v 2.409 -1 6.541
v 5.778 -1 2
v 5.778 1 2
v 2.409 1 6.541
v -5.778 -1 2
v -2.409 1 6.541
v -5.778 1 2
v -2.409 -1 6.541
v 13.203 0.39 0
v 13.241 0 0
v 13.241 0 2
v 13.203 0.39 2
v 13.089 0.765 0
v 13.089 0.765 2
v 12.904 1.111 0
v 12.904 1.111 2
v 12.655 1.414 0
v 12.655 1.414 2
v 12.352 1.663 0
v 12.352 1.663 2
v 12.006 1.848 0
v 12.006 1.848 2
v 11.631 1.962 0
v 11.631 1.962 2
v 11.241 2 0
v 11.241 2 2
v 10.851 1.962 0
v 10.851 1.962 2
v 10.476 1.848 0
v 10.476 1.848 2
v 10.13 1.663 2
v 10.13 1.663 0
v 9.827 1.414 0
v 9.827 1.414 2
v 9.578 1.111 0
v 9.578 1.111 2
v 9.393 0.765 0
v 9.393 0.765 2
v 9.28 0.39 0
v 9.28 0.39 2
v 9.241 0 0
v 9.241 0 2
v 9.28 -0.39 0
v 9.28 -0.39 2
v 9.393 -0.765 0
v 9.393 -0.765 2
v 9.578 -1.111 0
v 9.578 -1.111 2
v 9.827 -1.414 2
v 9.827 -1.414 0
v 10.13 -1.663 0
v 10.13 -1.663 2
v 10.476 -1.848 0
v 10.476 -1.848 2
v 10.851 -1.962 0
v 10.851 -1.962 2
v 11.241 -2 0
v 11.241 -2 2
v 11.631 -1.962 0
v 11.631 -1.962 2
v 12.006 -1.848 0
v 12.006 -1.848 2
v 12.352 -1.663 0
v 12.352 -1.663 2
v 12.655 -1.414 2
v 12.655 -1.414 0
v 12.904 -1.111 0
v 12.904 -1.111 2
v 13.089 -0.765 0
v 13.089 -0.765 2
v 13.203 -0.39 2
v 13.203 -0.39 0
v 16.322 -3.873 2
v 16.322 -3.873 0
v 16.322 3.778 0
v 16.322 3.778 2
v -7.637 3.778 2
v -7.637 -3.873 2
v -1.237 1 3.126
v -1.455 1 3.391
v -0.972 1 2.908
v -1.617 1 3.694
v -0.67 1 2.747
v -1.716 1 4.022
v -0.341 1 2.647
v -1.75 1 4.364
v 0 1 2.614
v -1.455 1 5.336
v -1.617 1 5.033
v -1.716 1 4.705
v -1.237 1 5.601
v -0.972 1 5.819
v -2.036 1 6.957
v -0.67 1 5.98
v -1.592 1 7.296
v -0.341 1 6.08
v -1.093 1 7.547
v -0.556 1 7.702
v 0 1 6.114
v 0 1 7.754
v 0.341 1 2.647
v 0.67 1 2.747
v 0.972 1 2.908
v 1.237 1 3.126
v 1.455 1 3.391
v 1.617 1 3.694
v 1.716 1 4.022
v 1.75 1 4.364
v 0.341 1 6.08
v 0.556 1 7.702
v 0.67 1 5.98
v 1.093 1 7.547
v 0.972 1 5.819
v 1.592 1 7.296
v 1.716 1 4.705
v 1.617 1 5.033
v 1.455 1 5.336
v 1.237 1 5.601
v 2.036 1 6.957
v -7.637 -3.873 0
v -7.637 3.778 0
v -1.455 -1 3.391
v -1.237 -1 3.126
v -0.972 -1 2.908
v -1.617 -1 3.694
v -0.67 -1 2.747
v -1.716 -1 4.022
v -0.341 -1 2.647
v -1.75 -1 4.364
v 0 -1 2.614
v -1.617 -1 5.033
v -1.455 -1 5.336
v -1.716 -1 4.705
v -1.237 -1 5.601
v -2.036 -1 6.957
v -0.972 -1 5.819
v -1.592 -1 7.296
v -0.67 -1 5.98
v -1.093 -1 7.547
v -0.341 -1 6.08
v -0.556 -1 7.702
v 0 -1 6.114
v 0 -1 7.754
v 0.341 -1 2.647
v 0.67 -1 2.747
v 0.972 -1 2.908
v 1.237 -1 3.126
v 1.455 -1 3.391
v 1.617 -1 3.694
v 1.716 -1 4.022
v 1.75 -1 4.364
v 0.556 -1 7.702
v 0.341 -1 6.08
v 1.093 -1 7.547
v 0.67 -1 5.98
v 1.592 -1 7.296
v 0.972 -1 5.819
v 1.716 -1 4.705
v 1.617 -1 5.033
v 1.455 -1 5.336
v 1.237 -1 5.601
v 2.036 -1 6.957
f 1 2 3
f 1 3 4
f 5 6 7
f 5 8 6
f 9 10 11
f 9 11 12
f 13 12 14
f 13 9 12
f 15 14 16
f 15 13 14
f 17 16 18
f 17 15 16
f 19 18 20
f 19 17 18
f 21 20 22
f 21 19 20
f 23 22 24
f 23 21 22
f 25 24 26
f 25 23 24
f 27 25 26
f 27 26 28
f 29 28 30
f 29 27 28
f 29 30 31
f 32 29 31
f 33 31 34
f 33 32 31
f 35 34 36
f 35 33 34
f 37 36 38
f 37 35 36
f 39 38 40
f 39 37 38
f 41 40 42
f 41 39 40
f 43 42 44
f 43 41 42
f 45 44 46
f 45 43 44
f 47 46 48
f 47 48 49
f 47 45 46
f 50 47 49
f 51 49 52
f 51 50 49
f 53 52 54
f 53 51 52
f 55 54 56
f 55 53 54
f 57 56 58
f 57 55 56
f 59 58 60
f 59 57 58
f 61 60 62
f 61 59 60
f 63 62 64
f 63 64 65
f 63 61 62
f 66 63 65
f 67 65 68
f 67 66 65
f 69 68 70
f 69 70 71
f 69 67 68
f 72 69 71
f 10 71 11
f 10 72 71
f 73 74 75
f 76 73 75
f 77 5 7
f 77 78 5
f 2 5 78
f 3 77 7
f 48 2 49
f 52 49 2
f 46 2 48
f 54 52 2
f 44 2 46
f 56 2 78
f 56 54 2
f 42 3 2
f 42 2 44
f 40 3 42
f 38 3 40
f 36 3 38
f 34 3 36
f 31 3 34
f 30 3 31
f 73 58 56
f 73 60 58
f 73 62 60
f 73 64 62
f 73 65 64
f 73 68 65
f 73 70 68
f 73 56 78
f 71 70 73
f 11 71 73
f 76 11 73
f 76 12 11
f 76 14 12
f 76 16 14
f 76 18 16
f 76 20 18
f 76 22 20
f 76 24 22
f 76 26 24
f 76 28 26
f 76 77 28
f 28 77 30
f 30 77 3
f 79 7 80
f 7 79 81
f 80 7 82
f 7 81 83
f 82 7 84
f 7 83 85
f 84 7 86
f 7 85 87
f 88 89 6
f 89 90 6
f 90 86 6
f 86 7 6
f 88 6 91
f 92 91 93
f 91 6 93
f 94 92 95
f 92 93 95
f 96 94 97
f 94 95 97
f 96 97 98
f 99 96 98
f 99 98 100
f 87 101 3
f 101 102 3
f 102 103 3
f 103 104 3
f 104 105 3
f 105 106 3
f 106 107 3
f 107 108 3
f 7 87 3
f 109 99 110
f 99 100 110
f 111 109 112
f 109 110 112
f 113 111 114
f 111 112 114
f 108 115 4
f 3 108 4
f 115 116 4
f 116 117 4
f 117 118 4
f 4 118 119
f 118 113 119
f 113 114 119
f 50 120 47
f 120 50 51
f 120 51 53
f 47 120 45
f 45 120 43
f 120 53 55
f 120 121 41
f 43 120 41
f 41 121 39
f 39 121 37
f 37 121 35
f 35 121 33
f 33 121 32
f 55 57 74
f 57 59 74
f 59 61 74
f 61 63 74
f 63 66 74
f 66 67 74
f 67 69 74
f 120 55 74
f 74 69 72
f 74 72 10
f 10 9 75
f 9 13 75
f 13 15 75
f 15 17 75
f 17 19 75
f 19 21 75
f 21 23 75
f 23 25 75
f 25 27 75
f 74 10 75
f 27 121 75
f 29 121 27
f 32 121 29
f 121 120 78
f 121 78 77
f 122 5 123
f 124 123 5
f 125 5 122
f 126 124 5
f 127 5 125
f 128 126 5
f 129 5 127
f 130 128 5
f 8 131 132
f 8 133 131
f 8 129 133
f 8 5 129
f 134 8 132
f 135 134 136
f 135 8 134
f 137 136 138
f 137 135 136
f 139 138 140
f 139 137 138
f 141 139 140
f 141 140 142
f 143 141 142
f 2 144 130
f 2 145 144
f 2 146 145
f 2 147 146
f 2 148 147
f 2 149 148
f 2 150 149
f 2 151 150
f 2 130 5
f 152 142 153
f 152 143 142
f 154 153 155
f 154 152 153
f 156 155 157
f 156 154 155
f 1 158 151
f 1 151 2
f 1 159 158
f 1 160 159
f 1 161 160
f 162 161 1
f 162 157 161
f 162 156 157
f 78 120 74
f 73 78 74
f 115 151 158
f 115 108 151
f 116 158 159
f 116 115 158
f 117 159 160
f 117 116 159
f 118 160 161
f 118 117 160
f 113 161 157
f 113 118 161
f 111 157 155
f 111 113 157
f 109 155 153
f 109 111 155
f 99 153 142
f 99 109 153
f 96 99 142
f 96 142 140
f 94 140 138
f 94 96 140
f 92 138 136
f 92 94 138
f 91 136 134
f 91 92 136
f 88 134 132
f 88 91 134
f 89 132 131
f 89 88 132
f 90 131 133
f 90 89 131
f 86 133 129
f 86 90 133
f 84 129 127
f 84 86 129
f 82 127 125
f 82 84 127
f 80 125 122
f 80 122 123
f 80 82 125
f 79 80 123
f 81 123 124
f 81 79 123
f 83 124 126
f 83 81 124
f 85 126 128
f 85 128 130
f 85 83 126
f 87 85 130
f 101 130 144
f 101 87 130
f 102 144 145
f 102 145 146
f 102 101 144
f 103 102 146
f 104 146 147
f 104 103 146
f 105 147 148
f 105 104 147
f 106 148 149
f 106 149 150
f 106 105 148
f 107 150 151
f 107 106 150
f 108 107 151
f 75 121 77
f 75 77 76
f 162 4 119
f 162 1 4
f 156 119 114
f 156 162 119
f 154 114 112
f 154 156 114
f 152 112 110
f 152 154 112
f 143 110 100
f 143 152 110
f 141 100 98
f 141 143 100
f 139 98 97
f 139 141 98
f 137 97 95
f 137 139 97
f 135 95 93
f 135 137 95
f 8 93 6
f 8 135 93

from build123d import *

# Parameters (mm, degrees)
F0_W     = 23.9590460792
F0_H     = 7.6507304548
F0_R     = 2
F1_DEPTH = 2
F2_R     = 1.75
F3_DEPTH = 1


# Not quite as in the source:
# - a feature names something its author has since deleted; it is built from what else it names


with BuildPart() as f1:
    # F0 (on Top) → F1 (new body)
    with BuildSketch(Plane.XY):
        with Locations((4.3424949229, -0.0471555286)):
            Rectangle(F0_W, F0_H)
        with Locations((11.2411081956, 0)):
            Circle(F0_R, mode=Mode.SUBTRACT)
    extrude(amount=F1_DEPTH)

    # F2 (on Front) → F3 (join, symmetric)
    with BuildSketch(Plane.XZ):
        with BuildLine():
            Line((-2.4094440999, 6.5410234491), (-5.7779996579, 2))
            Line((-5.7779996579, 2), (5.7779996579, 2))
            Line((5.7779996579, 2), (2.4094440999, 6.5410234491))
            ThreePointArc((2.4094440999, 6.5410234491), (0, 7.7536848887), (-2.4094440999, 6.5410234491))
        make_face()
        with Locations((0, 4.3635135517)):
            Circle(F2_R, mode=Mode.SUBTRACT)
    extrude(amount=F3_DEPTH, both=True)


solid = f1.part
